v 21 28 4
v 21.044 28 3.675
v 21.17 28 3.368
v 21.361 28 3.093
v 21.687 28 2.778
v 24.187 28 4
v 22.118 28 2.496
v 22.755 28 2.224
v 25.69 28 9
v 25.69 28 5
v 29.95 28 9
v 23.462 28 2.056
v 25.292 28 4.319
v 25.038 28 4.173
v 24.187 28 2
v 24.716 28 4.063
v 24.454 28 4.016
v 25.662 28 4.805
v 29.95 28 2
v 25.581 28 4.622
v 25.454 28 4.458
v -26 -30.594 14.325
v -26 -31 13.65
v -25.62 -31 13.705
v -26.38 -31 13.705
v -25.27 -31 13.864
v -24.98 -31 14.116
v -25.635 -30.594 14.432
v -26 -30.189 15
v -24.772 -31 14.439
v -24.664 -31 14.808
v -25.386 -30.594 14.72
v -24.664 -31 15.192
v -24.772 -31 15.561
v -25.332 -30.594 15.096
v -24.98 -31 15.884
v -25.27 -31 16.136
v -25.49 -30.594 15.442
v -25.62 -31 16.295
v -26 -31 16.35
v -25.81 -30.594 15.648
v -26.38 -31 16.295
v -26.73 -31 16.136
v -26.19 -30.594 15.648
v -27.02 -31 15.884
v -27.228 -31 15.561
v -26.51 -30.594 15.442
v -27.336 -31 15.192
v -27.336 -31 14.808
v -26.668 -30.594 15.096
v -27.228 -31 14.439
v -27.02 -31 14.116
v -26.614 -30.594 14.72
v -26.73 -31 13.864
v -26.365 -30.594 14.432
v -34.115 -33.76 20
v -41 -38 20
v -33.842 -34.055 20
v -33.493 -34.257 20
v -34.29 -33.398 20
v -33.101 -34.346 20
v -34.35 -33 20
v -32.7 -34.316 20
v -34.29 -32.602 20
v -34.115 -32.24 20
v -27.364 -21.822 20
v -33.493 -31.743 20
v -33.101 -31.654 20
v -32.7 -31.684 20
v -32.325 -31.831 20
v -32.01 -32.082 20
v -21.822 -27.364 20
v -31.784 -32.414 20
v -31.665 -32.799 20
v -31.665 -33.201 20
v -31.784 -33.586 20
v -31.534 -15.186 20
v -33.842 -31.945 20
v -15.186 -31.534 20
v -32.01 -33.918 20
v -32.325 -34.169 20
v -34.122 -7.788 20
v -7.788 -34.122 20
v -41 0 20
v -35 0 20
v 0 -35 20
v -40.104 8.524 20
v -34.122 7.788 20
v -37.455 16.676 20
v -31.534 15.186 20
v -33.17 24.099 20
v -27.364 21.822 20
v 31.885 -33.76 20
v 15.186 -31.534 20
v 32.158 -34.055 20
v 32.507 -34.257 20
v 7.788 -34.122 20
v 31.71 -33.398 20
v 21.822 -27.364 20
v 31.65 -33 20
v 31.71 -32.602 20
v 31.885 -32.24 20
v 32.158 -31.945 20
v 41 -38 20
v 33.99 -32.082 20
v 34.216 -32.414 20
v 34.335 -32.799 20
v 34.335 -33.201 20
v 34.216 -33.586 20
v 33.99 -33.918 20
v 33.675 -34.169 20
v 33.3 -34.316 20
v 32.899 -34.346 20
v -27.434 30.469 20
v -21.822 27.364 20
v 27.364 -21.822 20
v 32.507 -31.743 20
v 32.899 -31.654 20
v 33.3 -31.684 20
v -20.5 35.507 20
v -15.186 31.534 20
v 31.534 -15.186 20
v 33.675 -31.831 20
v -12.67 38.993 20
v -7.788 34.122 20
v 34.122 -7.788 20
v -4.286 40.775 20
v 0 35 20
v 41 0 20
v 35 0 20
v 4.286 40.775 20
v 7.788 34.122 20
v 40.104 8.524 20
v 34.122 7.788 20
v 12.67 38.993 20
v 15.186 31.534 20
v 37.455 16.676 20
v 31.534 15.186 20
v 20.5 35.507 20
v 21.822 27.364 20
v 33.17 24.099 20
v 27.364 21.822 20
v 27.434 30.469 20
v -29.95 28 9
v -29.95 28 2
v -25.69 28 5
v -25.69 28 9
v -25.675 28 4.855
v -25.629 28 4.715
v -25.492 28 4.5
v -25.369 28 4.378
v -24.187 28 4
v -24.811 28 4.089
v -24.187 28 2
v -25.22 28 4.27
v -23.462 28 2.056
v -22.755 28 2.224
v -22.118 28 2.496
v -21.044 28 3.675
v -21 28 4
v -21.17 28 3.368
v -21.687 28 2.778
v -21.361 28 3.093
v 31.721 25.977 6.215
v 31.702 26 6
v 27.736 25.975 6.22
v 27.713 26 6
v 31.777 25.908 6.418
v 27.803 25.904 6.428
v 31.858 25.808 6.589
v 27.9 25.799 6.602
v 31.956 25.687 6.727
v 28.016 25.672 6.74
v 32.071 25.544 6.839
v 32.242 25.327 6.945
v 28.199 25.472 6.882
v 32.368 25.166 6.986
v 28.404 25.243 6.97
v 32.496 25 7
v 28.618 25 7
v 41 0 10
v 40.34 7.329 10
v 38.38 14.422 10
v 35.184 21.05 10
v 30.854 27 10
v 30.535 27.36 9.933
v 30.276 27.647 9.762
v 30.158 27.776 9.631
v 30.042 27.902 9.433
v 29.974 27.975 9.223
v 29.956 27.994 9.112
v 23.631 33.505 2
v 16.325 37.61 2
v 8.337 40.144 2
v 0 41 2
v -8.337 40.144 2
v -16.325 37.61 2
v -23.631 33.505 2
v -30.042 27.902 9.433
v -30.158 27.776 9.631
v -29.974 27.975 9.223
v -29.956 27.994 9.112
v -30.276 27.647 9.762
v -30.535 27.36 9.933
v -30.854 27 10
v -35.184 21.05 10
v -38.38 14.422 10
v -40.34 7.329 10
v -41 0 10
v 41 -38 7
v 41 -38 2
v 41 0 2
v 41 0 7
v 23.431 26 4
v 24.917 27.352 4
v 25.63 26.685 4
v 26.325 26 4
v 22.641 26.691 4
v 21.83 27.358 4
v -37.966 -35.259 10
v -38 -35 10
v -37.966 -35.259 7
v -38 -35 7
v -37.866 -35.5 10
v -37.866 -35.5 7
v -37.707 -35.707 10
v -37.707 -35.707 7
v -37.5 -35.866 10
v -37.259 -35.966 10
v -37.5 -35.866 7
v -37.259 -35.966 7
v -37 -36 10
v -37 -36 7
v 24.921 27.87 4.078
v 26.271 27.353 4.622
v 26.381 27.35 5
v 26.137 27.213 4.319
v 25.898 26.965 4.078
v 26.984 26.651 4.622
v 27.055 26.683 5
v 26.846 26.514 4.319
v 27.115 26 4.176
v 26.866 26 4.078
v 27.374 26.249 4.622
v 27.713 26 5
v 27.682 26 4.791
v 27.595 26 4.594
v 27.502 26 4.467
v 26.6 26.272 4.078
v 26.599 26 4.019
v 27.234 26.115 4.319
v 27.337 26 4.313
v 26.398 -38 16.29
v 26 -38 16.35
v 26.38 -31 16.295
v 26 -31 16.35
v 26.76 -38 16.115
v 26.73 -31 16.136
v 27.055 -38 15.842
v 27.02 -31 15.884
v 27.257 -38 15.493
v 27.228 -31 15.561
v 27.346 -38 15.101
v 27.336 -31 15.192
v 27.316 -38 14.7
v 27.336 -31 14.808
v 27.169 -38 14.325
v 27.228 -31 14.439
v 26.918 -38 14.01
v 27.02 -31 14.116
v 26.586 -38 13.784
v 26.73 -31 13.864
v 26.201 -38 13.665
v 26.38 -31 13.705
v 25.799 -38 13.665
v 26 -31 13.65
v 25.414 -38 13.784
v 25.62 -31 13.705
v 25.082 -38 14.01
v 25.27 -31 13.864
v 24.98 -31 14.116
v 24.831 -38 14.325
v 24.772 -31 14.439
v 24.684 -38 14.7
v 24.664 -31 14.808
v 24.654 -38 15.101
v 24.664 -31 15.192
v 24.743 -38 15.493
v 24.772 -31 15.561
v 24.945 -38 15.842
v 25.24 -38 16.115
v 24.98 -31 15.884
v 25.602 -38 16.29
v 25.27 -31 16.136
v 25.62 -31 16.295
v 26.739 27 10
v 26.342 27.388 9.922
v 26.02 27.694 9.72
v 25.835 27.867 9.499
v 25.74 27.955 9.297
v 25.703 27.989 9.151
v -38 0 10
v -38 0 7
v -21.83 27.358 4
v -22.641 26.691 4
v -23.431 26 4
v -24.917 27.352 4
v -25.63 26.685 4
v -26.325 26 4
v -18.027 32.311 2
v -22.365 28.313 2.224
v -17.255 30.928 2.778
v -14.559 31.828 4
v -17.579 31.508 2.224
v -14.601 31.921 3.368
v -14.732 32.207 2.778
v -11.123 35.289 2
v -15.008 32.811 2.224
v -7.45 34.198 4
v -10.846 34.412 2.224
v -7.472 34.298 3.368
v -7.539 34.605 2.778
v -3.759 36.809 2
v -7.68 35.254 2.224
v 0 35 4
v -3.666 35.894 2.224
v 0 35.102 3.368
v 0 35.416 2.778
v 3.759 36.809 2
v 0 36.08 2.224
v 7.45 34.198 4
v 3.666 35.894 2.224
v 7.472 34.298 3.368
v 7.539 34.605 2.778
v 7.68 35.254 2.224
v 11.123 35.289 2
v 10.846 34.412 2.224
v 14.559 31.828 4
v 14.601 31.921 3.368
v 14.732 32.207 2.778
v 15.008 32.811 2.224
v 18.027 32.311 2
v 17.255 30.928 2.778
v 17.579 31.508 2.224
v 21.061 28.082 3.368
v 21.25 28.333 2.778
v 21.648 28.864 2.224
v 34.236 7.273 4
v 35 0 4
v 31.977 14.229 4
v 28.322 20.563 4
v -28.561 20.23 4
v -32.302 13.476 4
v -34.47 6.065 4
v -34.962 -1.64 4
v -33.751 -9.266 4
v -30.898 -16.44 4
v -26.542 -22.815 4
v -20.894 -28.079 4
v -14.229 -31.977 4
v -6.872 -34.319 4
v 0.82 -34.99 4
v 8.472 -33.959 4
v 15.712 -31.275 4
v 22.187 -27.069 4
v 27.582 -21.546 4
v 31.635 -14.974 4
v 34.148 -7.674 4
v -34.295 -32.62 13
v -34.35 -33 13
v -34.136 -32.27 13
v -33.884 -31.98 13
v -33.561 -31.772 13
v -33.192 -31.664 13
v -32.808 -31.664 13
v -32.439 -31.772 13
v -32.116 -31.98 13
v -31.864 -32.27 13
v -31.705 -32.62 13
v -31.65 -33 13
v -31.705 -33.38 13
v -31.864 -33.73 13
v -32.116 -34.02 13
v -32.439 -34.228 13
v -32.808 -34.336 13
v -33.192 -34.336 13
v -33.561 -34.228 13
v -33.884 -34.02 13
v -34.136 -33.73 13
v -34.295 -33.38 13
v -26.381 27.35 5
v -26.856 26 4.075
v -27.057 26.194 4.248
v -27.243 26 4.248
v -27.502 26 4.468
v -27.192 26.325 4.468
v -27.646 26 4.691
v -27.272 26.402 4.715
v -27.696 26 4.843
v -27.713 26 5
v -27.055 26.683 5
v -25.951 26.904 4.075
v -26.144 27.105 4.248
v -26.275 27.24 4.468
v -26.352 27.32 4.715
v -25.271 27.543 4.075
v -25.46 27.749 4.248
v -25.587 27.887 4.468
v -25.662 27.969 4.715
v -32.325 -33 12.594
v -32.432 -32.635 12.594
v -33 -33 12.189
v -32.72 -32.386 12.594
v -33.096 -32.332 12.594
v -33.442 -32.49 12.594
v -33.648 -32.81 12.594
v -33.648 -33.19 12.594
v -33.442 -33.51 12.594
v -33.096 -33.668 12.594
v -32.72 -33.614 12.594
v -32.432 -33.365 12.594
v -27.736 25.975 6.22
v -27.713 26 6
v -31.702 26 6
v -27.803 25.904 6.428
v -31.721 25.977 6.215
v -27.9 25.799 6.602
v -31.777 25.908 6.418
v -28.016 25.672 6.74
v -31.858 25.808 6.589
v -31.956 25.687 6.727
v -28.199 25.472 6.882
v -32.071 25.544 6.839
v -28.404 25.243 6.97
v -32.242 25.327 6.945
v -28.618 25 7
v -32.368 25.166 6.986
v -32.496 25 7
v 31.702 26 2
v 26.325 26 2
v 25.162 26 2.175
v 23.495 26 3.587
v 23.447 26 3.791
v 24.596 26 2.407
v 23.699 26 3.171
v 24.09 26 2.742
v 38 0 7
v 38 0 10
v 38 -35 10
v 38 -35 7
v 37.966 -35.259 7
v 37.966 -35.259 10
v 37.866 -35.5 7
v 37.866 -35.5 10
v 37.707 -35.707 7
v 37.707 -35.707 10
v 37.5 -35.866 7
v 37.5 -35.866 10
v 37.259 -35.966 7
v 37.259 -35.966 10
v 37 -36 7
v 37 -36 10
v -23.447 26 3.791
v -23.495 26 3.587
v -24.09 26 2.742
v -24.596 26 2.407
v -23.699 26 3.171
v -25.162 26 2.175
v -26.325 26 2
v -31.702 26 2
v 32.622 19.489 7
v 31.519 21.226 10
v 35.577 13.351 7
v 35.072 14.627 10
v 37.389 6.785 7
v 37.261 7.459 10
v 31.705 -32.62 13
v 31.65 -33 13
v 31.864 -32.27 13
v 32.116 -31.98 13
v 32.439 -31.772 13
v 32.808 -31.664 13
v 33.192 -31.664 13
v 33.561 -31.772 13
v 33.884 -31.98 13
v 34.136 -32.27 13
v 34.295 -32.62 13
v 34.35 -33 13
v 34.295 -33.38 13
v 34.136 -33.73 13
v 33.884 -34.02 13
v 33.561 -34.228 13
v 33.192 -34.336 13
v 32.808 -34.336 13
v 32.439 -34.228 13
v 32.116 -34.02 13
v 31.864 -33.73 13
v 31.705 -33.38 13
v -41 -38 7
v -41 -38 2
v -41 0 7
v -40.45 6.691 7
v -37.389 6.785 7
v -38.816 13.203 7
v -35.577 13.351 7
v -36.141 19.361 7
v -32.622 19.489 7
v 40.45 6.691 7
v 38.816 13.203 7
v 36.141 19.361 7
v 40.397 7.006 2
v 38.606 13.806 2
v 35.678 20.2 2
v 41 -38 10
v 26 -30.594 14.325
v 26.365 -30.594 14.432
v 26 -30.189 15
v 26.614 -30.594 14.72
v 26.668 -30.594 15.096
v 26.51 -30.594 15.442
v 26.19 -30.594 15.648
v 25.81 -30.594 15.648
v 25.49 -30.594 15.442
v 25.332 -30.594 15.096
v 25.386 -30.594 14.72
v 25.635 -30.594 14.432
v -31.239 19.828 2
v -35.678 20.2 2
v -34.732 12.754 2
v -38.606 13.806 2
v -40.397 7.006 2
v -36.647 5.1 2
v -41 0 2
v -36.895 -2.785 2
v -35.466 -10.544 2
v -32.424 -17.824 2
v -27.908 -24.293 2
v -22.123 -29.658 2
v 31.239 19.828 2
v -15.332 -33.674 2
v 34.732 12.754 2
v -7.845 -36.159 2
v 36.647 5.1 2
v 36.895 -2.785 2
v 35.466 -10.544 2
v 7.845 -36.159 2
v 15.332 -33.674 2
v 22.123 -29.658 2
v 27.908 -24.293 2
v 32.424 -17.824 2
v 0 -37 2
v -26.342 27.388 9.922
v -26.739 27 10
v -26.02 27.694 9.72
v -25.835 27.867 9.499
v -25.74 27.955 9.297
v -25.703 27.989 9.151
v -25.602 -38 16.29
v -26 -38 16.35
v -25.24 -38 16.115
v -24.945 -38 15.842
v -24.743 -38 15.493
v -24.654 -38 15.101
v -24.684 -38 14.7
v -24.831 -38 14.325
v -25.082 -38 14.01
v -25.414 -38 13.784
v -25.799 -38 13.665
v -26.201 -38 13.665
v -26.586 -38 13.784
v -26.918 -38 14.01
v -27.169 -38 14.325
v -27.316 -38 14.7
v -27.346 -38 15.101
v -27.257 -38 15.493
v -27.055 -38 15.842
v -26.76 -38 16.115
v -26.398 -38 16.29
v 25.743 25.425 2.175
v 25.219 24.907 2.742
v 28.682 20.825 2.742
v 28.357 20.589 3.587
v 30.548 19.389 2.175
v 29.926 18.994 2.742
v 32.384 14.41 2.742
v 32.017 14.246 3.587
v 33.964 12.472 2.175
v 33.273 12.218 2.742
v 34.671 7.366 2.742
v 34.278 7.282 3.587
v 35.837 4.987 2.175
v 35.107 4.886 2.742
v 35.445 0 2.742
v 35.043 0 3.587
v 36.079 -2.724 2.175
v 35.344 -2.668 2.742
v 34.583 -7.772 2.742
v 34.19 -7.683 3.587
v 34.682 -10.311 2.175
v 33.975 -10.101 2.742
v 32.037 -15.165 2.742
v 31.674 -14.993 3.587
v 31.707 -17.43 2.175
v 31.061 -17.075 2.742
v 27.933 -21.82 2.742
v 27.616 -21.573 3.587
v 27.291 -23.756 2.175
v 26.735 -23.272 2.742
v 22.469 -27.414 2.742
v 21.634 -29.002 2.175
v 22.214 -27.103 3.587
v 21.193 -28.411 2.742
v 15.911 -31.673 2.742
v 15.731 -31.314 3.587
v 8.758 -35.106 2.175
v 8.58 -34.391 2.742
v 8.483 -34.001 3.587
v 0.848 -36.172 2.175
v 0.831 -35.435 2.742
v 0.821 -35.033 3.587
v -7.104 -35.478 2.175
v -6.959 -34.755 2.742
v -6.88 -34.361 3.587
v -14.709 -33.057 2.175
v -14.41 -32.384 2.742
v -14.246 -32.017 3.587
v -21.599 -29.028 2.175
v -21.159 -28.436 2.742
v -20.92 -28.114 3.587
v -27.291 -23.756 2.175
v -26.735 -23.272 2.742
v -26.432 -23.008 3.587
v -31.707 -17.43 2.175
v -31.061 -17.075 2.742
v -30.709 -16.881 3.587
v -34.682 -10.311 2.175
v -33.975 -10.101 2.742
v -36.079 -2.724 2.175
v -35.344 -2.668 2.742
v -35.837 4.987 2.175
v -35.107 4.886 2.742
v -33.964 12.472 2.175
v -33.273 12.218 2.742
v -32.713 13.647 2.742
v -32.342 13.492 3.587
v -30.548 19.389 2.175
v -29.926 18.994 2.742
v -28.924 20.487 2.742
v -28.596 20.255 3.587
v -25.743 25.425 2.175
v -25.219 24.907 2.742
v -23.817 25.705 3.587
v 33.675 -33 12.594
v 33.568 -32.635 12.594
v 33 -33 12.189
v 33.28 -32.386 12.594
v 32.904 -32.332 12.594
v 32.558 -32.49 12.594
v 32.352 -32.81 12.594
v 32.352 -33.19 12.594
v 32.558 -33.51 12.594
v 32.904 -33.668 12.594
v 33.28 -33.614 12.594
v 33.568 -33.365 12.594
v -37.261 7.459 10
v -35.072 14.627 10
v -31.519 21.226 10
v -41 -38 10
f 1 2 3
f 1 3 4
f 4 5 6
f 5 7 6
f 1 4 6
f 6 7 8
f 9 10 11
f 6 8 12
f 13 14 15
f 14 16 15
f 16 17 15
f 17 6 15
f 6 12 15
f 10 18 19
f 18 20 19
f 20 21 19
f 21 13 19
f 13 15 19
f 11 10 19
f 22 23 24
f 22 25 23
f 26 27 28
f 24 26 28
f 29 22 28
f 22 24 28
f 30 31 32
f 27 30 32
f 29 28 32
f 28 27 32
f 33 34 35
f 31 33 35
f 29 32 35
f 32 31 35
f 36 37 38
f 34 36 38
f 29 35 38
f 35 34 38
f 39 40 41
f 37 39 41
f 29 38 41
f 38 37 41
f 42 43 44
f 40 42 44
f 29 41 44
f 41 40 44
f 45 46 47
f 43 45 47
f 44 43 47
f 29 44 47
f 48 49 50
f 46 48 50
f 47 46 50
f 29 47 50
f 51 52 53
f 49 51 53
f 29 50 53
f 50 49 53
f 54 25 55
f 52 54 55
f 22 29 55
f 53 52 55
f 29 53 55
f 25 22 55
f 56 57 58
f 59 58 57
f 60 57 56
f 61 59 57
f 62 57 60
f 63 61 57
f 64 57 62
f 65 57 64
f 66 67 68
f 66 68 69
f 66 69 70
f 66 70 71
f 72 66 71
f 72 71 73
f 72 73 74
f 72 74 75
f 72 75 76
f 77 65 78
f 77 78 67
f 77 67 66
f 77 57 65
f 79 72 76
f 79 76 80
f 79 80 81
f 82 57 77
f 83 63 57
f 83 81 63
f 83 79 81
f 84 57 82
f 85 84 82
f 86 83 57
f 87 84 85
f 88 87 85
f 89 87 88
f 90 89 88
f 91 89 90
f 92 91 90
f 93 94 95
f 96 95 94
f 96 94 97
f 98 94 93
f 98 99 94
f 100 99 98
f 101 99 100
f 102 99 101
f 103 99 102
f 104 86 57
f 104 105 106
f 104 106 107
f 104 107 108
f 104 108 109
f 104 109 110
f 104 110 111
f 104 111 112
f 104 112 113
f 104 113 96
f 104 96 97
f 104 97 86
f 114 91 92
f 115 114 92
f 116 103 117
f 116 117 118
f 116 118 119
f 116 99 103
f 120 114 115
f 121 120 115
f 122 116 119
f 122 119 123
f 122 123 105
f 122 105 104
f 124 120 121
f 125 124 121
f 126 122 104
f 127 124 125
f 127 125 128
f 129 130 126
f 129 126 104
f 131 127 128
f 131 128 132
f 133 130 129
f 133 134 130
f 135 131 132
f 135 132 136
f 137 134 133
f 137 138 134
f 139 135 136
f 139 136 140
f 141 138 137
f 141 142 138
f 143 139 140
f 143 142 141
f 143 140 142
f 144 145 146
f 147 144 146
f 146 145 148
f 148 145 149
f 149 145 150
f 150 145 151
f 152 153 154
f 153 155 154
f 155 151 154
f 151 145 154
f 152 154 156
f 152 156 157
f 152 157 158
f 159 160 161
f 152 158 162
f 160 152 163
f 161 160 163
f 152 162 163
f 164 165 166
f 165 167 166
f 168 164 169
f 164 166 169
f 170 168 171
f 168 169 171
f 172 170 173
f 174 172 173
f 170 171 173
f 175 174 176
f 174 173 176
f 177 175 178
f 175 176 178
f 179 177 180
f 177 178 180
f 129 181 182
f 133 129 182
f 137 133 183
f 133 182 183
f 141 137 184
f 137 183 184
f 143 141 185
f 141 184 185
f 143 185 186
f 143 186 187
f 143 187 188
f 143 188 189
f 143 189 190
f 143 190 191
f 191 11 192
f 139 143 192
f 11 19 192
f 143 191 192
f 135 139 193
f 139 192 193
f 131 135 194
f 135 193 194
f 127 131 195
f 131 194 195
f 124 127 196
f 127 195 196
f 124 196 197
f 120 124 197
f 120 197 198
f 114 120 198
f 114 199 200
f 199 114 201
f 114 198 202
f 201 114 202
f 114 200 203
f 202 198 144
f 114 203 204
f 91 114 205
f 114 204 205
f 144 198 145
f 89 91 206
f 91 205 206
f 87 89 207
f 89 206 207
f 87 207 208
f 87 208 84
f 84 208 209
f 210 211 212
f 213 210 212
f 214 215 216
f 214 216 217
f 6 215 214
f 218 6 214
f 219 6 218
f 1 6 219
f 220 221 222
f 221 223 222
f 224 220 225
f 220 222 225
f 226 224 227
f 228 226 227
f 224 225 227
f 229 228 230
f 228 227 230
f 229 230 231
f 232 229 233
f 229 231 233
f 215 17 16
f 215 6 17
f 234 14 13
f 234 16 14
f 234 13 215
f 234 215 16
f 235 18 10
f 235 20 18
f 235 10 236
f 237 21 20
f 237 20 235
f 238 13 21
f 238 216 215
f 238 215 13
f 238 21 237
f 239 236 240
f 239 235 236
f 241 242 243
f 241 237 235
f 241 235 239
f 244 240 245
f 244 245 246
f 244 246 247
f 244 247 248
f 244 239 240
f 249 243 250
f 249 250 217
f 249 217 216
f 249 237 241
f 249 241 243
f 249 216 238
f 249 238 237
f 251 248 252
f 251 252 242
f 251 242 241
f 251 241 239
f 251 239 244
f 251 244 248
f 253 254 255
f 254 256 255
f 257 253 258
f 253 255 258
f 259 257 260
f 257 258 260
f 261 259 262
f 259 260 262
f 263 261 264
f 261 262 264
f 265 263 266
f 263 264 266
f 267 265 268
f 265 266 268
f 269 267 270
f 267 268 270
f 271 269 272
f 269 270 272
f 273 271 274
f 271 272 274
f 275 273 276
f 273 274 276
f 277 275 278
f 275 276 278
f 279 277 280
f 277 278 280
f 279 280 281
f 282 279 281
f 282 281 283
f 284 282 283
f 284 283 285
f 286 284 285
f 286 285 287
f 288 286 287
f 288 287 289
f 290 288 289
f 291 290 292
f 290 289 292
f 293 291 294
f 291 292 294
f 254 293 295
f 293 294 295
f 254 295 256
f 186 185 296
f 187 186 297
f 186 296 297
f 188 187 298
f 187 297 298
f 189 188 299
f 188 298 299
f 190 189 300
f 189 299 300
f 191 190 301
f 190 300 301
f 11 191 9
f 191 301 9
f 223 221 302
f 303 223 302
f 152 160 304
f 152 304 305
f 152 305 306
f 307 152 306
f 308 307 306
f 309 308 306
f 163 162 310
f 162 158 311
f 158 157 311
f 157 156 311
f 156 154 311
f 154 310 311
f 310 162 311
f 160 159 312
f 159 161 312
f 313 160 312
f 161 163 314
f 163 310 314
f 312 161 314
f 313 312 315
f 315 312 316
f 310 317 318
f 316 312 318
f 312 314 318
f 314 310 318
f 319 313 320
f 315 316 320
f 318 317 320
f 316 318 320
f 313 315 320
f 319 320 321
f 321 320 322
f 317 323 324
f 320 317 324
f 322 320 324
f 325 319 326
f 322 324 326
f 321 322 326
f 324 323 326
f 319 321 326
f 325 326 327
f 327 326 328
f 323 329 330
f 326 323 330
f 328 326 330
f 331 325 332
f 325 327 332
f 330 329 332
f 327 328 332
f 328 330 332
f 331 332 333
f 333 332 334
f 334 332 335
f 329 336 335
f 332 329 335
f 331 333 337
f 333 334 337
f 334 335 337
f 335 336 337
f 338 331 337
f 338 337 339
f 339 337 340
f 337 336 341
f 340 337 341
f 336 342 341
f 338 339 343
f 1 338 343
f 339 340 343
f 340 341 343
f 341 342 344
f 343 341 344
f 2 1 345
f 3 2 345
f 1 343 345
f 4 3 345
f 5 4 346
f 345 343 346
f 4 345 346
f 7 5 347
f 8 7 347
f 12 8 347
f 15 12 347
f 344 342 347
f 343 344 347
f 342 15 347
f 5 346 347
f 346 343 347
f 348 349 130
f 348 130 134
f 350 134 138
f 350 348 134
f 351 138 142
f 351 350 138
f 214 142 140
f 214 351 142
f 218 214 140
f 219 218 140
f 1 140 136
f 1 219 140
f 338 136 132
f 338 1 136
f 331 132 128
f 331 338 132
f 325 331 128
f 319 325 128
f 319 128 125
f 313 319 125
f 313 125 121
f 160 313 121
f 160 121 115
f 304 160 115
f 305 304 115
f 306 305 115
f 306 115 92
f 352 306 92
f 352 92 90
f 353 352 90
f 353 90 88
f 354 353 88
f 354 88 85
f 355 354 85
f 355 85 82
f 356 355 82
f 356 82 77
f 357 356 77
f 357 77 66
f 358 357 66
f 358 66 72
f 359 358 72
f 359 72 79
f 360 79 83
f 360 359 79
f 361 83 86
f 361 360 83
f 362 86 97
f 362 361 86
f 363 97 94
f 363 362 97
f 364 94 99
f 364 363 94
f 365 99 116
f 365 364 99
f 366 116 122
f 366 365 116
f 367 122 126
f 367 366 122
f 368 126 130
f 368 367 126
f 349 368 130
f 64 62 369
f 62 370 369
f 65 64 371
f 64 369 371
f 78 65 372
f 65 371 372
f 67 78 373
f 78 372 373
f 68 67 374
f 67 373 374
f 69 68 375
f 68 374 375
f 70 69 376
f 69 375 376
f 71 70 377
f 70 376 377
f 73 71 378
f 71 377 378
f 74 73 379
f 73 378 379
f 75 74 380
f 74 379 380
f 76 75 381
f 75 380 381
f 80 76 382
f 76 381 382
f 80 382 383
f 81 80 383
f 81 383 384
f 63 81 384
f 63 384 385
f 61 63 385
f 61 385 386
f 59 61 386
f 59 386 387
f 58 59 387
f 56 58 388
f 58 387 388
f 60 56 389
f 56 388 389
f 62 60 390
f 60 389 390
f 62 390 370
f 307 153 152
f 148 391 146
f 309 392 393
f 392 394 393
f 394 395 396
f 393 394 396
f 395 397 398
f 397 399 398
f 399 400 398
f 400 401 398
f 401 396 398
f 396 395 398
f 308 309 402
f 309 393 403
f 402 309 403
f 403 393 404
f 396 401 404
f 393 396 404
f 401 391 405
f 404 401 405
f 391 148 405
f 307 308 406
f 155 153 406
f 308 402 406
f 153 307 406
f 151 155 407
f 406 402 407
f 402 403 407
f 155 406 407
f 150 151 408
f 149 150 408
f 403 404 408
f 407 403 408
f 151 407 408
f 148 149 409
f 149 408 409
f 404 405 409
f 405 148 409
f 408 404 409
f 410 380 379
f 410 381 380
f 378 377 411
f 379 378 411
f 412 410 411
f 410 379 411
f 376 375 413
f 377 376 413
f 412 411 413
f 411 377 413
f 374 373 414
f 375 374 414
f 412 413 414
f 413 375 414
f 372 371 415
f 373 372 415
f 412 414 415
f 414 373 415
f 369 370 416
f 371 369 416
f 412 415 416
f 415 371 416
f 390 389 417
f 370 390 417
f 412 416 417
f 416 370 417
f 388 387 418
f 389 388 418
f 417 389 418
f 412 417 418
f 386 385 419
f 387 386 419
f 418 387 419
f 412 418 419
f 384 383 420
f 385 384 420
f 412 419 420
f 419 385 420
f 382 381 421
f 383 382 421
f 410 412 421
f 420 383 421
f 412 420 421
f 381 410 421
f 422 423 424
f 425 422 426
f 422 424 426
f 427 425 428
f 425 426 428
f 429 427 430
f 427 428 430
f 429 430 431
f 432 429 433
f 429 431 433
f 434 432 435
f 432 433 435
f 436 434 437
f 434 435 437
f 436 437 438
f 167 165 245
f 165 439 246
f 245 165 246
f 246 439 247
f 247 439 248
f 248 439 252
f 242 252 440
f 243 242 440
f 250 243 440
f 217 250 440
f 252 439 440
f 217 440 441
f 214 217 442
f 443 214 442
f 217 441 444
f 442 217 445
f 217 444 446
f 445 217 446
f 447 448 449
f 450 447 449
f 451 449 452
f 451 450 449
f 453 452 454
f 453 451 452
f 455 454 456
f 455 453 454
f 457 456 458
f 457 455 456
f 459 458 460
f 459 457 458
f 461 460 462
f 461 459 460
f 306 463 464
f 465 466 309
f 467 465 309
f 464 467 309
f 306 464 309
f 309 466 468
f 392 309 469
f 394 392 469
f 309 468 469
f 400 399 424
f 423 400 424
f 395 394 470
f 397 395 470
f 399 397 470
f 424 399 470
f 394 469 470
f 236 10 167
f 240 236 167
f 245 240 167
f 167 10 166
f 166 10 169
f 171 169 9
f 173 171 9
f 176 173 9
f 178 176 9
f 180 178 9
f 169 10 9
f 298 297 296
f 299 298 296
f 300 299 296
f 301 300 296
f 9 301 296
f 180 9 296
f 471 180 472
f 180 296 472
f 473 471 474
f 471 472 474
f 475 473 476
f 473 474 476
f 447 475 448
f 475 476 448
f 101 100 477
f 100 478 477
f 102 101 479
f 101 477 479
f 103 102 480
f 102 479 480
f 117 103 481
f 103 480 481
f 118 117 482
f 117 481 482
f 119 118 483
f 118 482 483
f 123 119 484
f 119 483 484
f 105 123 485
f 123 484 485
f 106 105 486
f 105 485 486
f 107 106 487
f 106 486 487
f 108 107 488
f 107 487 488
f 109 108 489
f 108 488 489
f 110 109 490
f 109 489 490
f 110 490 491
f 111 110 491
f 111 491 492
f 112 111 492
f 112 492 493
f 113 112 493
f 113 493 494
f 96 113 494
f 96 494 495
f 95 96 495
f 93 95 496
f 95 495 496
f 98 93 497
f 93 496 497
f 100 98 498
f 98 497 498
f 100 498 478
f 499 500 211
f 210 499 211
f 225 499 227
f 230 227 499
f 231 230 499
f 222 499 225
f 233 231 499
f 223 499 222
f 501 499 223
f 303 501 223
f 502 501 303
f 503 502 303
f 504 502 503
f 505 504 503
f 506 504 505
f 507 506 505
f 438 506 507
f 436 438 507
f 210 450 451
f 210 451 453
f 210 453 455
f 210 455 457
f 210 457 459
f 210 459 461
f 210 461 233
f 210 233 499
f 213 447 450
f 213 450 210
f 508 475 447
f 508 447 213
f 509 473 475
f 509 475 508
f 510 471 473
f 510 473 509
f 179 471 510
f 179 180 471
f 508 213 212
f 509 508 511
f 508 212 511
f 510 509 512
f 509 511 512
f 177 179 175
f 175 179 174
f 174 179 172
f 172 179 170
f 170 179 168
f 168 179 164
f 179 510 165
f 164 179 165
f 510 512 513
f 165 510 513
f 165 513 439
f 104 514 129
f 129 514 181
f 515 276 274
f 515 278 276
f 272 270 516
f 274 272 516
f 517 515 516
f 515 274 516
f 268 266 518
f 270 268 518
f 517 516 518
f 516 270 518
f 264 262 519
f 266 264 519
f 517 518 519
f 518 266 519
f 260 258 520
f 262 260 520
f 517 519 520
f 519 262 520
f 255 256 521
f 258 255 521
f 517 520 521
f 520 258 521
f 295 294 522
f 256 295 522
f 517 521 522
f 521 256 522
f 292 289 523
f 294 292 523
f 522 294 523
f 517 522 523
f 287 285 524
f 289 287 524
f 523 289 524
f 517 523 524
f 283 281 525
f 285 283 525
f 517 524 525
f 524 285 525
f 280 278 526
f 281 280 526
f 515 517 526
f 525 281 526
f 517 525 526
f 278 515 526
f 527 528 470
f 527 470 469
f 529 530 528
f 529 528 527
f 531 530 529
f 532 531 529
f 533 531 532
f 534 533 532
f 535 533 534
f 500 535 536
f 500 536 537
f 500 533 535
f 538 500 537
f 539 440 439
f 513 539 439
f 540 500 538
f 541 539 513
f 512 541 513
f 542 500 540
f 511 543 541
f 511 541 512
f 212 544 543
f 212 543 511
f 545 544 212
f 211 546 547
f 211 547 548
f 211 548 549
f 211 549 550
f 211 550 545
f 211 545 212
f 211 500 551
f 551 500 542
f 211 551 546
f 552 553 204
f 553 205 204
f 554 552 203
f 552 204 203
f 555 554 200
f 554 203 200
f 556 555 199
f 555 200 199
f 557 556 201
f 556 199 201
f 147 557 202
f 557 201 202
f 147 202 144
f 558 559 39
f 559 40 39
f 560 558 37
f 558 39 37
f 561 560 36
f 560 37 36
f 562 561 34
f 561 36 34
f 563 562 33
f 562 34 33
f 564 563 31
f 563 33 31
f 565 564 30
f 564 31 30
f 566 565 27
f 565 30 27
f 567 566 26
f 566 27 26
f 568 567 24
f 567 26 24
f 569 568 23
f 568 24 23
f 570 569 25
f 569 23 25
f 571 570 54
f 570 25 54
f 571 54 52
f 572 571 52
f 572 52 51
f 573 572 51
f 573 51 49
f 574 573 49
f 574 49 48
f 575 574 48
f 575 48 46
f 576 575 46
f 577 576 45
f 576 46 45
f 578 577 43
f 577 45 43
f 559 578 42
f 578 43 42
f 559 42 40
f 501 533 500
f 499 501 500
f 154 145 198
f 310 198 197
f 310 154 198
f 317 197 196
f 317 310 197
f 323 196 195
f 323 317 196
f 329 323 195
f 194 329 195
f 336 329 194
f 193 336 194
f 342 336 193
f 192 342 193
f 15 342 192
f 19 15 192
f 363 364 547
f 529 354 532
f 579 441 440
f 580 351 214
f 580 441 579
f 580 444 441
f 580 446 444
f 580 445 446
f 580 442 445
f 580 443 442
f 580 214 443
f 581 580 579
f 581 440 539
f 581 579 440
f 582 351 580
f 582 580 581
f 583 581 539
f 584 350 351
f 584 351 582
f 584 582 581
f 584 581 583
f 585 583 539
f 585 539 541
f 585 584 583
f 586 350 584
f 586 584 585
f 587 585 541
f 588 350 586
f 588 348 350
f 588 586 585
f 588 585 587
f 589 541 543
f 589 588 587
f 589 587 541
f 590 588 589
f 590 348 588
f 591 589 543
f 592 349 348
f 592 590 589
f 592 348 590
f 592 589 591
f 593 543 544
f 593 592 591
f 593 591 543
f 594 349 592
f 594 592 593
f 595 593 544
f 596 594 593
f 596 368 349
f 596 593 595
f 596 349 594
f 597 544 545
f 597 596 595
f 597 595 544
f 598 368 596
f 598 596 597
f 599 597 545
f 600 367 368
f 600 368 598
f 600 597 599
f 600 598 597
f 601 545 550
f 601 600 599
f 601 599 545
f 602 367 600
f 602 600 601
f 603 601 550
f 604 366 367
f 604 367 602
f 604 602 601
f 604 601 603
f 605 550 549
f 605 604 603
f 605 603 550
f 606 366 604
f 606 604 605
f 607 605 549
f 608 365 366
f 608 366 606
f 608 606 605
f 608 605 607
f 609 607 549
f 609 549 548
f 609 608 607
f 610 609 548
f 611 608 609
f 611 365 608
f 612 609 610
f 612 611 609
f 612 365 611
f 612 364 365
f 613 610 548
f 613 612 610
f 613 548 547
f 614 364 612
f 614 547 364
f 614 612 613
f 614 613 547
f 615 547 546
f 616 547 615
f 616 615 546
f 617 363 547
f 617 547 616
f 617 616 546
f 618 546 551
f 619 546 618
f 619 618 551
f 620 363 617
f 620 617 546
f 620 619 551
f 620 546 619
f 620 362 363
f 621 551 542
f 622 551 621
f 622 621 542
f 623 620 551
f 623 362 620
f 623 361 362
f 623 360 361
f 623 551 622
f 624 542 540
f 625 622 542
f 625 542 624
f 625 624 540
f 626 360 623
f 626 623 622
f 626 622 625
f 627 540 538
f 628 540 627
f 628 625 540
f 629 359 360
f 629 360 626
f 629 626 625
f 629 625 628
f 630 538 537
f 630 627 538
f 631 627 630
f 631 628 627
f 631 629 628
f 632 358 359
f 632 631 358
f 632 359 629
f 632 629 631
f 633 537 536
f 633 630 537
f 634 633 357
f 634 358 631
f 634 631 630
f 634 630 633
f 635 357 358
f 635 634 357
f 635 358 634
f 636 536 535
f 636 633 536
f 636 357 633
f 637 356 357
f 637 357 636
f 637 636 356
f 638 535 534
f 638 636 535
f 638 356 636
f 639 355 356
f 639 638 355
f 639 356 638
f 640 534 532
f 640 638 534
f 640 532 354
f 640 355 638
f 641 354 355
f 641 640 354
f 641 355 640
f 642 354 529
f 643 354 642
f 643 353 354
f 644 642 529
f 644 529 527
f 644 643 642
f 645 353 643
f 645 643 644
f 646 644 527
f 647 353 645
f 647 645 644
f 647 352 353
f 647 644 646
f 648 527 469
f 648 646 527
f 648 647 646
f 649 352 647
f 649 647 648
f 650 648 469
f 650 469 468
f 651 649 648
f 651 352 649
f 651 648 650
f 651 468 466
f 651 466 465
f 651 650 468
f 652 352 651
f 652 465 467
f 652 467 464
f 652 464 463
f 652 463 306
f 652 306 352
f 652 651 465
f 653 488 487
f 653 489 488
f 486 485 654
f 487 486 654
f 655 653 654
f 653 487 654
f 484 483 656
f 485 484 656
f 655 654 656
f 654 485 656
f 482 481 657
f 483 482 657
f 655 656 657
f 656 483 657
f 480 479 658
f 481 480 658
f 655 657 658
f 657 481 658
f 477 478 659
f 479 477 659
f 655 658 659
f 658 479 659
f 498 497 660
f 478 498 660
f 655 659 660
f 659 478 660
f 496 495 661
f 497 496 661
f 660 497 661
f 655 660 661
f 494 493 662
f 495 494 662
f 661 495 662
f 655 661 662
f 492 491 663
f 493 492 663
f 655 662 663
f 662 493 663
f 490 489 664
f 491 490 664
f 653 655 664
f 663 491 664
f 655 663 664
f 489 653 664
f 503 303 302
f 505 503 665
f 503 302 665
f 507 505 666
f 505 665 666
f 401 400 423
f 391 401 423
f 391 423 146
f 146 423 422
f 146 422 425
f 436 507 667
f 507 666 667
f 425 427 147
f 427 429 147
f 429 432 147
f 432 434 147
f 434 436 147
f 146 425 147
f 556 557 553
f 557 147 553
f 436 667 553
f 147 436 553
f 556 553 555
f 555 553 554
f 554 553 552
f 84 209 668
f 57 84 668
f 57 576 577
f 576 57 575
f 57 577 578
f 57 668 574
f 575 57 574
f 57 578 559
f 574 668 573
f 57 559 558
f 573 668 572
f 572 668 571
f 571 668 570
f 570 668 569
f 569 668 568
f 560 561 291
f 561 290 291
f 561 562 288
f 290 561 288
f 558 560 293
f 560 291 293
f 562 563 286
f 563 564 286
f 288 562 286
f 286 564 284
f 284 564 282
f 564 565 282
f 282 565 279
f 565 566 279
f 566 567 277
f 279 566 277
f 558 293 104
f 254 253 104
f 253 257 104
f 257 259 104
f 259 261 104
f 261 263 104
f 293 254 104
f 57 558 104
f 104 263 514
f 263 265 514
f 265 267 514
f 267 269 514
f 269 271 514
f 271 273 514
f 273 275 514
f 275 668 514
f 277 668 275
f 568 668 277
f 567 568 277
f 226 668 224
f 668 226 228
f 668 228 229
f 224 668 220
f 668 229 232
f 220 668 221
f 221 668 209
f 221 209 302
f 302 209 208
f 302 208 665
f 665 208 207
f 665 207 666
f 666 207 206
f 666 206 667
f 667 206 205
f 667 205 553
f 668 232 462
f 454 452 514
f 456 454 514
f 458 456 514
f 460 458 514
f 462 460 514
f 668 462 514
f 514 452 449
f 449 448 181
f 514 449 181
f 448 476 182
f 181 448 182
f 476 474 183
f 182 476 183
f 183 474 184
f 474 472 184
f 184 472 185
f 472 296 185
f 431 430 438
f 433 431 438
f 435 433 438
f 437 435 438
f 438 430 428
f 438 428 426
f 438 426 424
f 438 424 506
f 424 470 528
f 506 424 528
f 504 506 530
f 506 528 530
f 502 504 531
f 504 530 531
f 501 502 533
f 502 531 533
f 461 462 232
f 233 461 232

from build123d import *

# Parameters (mm, degrees)
SKETCH_1_R                            = 35.00000000000001
EXTRUDE_21_DEPTH                      = 20
CUT_EXTRUDE_2_DEPTH                   = 4
CUT_EXTRUDE_3_DEPTH                   = 8
CUT_EXTRUDE_4_DEPTH                   = 1
CUT_EXTRUDE_4_DEPTH_BACK              = 2
FILLET_1_R                            = 1
SKETCH_8_W                            = 82
SKETCH_8_H                            = 2
CUT_EXTRUDE_5_DEPTH                   = 92.22499672787059
FILLET_3_R                            = 2
HOLE_WIZARD_2_7_2_7_1_D               = 2.7
HOLE_WIZARD_2_7_2_7_1_DEPTH           = 7
HOLE_WIZARD_2_7_2_7_1_TIP             = 0.8111618356872065
HOLE_WIZARD_2_7_2_7_1_ON_FACE_2_D     = 2.7
HOLE_WIZARD_2_7_2_7_1_ON_FACE_2_DEPTH = 7
HOLE_WIZARD_2_7_2_7_1_ON_FACE_2_TIP   = 0.8111618356872065


with BuildPart() as part:
    # 草图1 → 厚度21 (new body)
    with BuildSketch(Plane.XY):
        with BuildLine():
            Line((-41, 0), (-41, -38.00000000000001))
            Line((-41, -38.00000000000001), (41, -38.00000000000001))
            Line((41, -38.00000000000001), (41, 0))
            ThreePointArc((41, 0), (2.51e-15, 41), (-41, 0))
        make_face()
        Circle(SKETCH_1_R, mode=Mode.SUBTRACT)
    extrude(amount=EXTRUDE_21_DEPTH)

    # 草图5 → 切除-拉伸2 (cut)
    with BuildSketch(Plane(origin=(0, 0, 0), x_dir=(-1, 0, 0), z_dir=(0, 0, -1))):
        with BuildLine():
            Line((-21.000000000000004, 28.00000000000001), (-25.690465157330244, 28.000000000000007))
            ThreePointArc((-25.690465157330244, 28.000000000000007), (-26.720357920143798, 27.01892804349219), (-27.712812921102028, 26.00000000000001))
            Line((-27.712812921102028, 26.00000000000001), (-23.430749027719965, 26.000000000000007))
            ThreePointArc((-23.43074902771997, 26.000000000000007), (-22.237870059676574, 27.02734051306086), (-21.000000000000007, 28.00000000000001))
        make_face()
        with BuildLine():
            Line((25.690465157330244, 28.00000000000001), (20.99999999999999, 28.00000000000001))
            ThreePointArc((20.99999999999999, 28.000000000000014), (22.237870059676567, 27.027340513060857), (23.430749027719965, 26.000000000000007))
            Line((23.430749027719965, 26.000000000000007), (27.712812921102028, 26.00000000000001))
            ThreePointArc((27.712812921102035, 26.000000000000014), (26.720357920143798, 27.018928043492192), (25.69046515733025, 28.000000000000018))
        make_face()
    extrude(amount=-CUT_EXTRUDE_2_DEPTH, mode=Mode.SUBTRACT)

    # 草图6 → 切除-拉伸3 (cut)
    with BuildSketch(Plane(origin=(0, 0, 0), x_dir=(-1, 0, 0), z_dir=(0, 0, -1))):
        with BuildLine():
            ThreePointArc((-27.712812921102028, 26.000000000000004), (-26.72035792014379, 27.01892804349218), (-25.690465157330244, 28.00000000000001))
            Line((-25.690465157330244, 28.000000000000007), (-29.949958263743014, 28.000000000000007))
            ThreePointArc((-29.949958263743238, 28.00000000000068), (-30.842062505518594, 27.014203308735276), (-31.701734968294286, 26.000000000000522))
            Line((-31.70173496829411, 26.000000000000007), (-27.712812921102028, 26.000000000000004))
        make_face()
        with BuildLine():
            ThreePointArc((31.70173496829428, 26.00000000000053), (30.842062505518587, 27.01420330873528), (29.949958263743248, 28.000000000000668))
            Line((29.94995826374302, 28.000000000000007), (25.690465157330244, 28.000000000000007))
            ThreePointArc((25.690465157330244, 28.000000000000007), (26.720357920143798, 27.01892804349219), (27.712812921102028, 26.000000000000007))
            Line((27.712812921102028, 26.000000000000004), (31.701734968294097, 26.000000000000007))
        make_face()
        with BuildLine():
            Line((37.167004412093284, 28.000000000000007), (29.94995826374302, 28.000000000000007))
            ThreePointArc((29.949958263743248, 28.000000000000668), (30.842062505518587, 27.01420330873528), (31.70173496829428, 26.00000000000053))
            Line((31.701734968294097, 26.000000000000007), (37.167004412093284, 26.00000000000001))
            Line((37.167004412093284, 26.00000000000001), (37.167004412093284, 28.000000000000007))
        make_face()
        with BuildLine():
            ThreePointArc((-31.701734968294286, 26.000000000000522), (-30.842062505518594, 27.014203308735276), (-29.949958263743238, 28.00000000000068))
            Line((-29.949958263743014, 28.000000000000007), (-37.167004412093284, 28.000000000000007))
            Line((-37.167004412093284, 28.000000000000007), (-37.167004412093284, 26.00000000000001))
            Line((-37.167004412093284, 26.00000000000001), (-31.70173496829411, 26.000000000000007))
        make_face()
    extrude(amount=-CUT_EXTRUDE_3_DEPTH, mode=Mode.SUBTRACT)

    # 草图7 → 切除-拉伸4 (cut, two sides: drawn at the far end of the back side and taken through both)
    with BuildSketch(Plane(origin=(0, 0, 8), x_dir=(-1, 0, 0), z_dir=(0, 0, -1)).offset(-CUT_EXTRUDE_4_DEPTH_BACK)):
        with BuildLine():
            Line((-38, -36.00000000000001), (37.99999999999999, -36.00000000000001))
            Line((37.99999999999999, -36.00000000000001), (37.99999999999999, 0))
            ThreePointArc((37.99999999999999, 0), (34.786762395906784, 15.29317370628887), (25.690465157330244, 28.00000000000001))
            Line((25.690465157330244, 28.00000000000001), (29.949958263743873, 28.000000000000007))
            ThreePointArc((29.949958263743873, 28.000000000000007), (38.13756867455958, 15.050775913329202), (40.999999999999986, 0))
            Line((40.999999999999986, 0), (41, -38.00000000000001))
            Line((41, -38.00000000000001), (-41, -38.00000000000001))
            Line((-41, -38.00000000000001), (-40.999999999999986, 0))
            ThreePointArc((-40.999999999999986, 0), (-38.137568674559596, 15.050775913329224), (-29.949958263743873, 28.000000000000007))
            Line((-29.949958263743873, 28.000000000000007), (-25.69046515733023, 28.00000000000001))
            ThreePointArc((-25.69046515733023, 28.00000000000001), (-34.78676239590678, 15.293173706288876), (-37.99999999999999, 0))
            Line((-37.99999999999999, 0), (-38, -36.00000000000001))
        make_face()
    extrude(amount=CUT_EXTRUDE_4_DEPTH + CUT_EXTRUDE_4_DEPTH_BACK, mode=Mode.SUBTRACT)

    # 圆角1
    fillet_1_edges = [part.edges().sort_by_distance(p)[0] for p in [
        (29.707273944699274, 26.000000000000004, 7),
        (-29.707273944699253, 26.000000000000004, 7),
        (-37.99999999999999, -36.00000000000001, 8.5),
        (38, -36.00000000000001, 8.5),
        (-27.82021171053706, 28.000000000000007, 10),
        (27.820211710537052, 28.000000000000007, 10),
        (26.72035792014379, 27.01892804349218, 4),
        (-26.720357920143798, 27.018928043492195, 4),
    ]]
    fillet(fillet_1_edges, radius=FILLET_1_R)

    # 草图8 → 切除-拉伸5 (cut, through all)
    with BuildSketch(Plane.XZ.offset(38.00000000000001)):
        with Locations((0, 1)):
            Rectangle(SKETCH_8_W, SKETCH_8_H)
    extrude(amount=-CUT_EXTRUDE_5_DEPTH, mode=Mode.SUBTRACT)

    # 圆角3
    fillet_3_edges = [part.edges().sort_by_distance(p)[0] for p in [
        (-14.228910429646426, -31.97714977894527, 2),
        (-6.43e-15, 35.00000000000001, 2),
    ]]
    fillet(fillet_3_edges, radius=FILLET_3_R)

    # Ø2.7 (2.7) 直径孔1
    with Locations(Plane(origin=(-33, -33, 20), x_dir=(1, 0, 0), z_dir=(0, 0, 1))):
        with Locations((0, 0), (66, 0)):
            Hole(HOLE_WIZARD_2_7_2_7_1_D / 2, depth=HOLE_WIZARD_2_7_2_7_1_DEPTH)
            with Locations((0, 0, -(HOLE_WIZARD_2_7_2_7_1_DEPTH + HOLE_WIZARD_2_7_2_7_1_TIP / 2))):  # 118° drill point
                Cone(0, HOLE_WIZARD_2_7_2_7_1_D / 2, HOLE_WIZARD_2_7_2_7_1_TIP, mode=Mode.SUBTRACT)

    # Ø2.7 (2.7) 直径孔1 on face 2
    with Locations(Plane(origin=(26, -38, 15), x_dir=(0, 0, -1), z_dir=(0, -1, 0))):
        with Locations((0, 0), (0, -52)):
            Hole(HOLE_WIZARD_2_7_2_7_1_ON_FACE_2_D / 2, depth=HOLE_WIZARD_2_7_2_7_1_ON_FACE_2_DEPTH)
            with Locations((0, 0, -(HOLE_WIZARD_2_7_2_7_1_ON_FACE_2_DEPTH + HOLE_WIZARD_2_7_2_7_1_ON_FACE_2_TIP / 2))):  # 118° drill point
                Cone(0, HOLE_WIZARD_2_7_2_7_1_ON_FACE_2_D / 2, HOLE_WIZARD_2_7_2_7_1_ON_FACE_2_TIP, mode=Mode.SUBTRACT)


solid = part.part
